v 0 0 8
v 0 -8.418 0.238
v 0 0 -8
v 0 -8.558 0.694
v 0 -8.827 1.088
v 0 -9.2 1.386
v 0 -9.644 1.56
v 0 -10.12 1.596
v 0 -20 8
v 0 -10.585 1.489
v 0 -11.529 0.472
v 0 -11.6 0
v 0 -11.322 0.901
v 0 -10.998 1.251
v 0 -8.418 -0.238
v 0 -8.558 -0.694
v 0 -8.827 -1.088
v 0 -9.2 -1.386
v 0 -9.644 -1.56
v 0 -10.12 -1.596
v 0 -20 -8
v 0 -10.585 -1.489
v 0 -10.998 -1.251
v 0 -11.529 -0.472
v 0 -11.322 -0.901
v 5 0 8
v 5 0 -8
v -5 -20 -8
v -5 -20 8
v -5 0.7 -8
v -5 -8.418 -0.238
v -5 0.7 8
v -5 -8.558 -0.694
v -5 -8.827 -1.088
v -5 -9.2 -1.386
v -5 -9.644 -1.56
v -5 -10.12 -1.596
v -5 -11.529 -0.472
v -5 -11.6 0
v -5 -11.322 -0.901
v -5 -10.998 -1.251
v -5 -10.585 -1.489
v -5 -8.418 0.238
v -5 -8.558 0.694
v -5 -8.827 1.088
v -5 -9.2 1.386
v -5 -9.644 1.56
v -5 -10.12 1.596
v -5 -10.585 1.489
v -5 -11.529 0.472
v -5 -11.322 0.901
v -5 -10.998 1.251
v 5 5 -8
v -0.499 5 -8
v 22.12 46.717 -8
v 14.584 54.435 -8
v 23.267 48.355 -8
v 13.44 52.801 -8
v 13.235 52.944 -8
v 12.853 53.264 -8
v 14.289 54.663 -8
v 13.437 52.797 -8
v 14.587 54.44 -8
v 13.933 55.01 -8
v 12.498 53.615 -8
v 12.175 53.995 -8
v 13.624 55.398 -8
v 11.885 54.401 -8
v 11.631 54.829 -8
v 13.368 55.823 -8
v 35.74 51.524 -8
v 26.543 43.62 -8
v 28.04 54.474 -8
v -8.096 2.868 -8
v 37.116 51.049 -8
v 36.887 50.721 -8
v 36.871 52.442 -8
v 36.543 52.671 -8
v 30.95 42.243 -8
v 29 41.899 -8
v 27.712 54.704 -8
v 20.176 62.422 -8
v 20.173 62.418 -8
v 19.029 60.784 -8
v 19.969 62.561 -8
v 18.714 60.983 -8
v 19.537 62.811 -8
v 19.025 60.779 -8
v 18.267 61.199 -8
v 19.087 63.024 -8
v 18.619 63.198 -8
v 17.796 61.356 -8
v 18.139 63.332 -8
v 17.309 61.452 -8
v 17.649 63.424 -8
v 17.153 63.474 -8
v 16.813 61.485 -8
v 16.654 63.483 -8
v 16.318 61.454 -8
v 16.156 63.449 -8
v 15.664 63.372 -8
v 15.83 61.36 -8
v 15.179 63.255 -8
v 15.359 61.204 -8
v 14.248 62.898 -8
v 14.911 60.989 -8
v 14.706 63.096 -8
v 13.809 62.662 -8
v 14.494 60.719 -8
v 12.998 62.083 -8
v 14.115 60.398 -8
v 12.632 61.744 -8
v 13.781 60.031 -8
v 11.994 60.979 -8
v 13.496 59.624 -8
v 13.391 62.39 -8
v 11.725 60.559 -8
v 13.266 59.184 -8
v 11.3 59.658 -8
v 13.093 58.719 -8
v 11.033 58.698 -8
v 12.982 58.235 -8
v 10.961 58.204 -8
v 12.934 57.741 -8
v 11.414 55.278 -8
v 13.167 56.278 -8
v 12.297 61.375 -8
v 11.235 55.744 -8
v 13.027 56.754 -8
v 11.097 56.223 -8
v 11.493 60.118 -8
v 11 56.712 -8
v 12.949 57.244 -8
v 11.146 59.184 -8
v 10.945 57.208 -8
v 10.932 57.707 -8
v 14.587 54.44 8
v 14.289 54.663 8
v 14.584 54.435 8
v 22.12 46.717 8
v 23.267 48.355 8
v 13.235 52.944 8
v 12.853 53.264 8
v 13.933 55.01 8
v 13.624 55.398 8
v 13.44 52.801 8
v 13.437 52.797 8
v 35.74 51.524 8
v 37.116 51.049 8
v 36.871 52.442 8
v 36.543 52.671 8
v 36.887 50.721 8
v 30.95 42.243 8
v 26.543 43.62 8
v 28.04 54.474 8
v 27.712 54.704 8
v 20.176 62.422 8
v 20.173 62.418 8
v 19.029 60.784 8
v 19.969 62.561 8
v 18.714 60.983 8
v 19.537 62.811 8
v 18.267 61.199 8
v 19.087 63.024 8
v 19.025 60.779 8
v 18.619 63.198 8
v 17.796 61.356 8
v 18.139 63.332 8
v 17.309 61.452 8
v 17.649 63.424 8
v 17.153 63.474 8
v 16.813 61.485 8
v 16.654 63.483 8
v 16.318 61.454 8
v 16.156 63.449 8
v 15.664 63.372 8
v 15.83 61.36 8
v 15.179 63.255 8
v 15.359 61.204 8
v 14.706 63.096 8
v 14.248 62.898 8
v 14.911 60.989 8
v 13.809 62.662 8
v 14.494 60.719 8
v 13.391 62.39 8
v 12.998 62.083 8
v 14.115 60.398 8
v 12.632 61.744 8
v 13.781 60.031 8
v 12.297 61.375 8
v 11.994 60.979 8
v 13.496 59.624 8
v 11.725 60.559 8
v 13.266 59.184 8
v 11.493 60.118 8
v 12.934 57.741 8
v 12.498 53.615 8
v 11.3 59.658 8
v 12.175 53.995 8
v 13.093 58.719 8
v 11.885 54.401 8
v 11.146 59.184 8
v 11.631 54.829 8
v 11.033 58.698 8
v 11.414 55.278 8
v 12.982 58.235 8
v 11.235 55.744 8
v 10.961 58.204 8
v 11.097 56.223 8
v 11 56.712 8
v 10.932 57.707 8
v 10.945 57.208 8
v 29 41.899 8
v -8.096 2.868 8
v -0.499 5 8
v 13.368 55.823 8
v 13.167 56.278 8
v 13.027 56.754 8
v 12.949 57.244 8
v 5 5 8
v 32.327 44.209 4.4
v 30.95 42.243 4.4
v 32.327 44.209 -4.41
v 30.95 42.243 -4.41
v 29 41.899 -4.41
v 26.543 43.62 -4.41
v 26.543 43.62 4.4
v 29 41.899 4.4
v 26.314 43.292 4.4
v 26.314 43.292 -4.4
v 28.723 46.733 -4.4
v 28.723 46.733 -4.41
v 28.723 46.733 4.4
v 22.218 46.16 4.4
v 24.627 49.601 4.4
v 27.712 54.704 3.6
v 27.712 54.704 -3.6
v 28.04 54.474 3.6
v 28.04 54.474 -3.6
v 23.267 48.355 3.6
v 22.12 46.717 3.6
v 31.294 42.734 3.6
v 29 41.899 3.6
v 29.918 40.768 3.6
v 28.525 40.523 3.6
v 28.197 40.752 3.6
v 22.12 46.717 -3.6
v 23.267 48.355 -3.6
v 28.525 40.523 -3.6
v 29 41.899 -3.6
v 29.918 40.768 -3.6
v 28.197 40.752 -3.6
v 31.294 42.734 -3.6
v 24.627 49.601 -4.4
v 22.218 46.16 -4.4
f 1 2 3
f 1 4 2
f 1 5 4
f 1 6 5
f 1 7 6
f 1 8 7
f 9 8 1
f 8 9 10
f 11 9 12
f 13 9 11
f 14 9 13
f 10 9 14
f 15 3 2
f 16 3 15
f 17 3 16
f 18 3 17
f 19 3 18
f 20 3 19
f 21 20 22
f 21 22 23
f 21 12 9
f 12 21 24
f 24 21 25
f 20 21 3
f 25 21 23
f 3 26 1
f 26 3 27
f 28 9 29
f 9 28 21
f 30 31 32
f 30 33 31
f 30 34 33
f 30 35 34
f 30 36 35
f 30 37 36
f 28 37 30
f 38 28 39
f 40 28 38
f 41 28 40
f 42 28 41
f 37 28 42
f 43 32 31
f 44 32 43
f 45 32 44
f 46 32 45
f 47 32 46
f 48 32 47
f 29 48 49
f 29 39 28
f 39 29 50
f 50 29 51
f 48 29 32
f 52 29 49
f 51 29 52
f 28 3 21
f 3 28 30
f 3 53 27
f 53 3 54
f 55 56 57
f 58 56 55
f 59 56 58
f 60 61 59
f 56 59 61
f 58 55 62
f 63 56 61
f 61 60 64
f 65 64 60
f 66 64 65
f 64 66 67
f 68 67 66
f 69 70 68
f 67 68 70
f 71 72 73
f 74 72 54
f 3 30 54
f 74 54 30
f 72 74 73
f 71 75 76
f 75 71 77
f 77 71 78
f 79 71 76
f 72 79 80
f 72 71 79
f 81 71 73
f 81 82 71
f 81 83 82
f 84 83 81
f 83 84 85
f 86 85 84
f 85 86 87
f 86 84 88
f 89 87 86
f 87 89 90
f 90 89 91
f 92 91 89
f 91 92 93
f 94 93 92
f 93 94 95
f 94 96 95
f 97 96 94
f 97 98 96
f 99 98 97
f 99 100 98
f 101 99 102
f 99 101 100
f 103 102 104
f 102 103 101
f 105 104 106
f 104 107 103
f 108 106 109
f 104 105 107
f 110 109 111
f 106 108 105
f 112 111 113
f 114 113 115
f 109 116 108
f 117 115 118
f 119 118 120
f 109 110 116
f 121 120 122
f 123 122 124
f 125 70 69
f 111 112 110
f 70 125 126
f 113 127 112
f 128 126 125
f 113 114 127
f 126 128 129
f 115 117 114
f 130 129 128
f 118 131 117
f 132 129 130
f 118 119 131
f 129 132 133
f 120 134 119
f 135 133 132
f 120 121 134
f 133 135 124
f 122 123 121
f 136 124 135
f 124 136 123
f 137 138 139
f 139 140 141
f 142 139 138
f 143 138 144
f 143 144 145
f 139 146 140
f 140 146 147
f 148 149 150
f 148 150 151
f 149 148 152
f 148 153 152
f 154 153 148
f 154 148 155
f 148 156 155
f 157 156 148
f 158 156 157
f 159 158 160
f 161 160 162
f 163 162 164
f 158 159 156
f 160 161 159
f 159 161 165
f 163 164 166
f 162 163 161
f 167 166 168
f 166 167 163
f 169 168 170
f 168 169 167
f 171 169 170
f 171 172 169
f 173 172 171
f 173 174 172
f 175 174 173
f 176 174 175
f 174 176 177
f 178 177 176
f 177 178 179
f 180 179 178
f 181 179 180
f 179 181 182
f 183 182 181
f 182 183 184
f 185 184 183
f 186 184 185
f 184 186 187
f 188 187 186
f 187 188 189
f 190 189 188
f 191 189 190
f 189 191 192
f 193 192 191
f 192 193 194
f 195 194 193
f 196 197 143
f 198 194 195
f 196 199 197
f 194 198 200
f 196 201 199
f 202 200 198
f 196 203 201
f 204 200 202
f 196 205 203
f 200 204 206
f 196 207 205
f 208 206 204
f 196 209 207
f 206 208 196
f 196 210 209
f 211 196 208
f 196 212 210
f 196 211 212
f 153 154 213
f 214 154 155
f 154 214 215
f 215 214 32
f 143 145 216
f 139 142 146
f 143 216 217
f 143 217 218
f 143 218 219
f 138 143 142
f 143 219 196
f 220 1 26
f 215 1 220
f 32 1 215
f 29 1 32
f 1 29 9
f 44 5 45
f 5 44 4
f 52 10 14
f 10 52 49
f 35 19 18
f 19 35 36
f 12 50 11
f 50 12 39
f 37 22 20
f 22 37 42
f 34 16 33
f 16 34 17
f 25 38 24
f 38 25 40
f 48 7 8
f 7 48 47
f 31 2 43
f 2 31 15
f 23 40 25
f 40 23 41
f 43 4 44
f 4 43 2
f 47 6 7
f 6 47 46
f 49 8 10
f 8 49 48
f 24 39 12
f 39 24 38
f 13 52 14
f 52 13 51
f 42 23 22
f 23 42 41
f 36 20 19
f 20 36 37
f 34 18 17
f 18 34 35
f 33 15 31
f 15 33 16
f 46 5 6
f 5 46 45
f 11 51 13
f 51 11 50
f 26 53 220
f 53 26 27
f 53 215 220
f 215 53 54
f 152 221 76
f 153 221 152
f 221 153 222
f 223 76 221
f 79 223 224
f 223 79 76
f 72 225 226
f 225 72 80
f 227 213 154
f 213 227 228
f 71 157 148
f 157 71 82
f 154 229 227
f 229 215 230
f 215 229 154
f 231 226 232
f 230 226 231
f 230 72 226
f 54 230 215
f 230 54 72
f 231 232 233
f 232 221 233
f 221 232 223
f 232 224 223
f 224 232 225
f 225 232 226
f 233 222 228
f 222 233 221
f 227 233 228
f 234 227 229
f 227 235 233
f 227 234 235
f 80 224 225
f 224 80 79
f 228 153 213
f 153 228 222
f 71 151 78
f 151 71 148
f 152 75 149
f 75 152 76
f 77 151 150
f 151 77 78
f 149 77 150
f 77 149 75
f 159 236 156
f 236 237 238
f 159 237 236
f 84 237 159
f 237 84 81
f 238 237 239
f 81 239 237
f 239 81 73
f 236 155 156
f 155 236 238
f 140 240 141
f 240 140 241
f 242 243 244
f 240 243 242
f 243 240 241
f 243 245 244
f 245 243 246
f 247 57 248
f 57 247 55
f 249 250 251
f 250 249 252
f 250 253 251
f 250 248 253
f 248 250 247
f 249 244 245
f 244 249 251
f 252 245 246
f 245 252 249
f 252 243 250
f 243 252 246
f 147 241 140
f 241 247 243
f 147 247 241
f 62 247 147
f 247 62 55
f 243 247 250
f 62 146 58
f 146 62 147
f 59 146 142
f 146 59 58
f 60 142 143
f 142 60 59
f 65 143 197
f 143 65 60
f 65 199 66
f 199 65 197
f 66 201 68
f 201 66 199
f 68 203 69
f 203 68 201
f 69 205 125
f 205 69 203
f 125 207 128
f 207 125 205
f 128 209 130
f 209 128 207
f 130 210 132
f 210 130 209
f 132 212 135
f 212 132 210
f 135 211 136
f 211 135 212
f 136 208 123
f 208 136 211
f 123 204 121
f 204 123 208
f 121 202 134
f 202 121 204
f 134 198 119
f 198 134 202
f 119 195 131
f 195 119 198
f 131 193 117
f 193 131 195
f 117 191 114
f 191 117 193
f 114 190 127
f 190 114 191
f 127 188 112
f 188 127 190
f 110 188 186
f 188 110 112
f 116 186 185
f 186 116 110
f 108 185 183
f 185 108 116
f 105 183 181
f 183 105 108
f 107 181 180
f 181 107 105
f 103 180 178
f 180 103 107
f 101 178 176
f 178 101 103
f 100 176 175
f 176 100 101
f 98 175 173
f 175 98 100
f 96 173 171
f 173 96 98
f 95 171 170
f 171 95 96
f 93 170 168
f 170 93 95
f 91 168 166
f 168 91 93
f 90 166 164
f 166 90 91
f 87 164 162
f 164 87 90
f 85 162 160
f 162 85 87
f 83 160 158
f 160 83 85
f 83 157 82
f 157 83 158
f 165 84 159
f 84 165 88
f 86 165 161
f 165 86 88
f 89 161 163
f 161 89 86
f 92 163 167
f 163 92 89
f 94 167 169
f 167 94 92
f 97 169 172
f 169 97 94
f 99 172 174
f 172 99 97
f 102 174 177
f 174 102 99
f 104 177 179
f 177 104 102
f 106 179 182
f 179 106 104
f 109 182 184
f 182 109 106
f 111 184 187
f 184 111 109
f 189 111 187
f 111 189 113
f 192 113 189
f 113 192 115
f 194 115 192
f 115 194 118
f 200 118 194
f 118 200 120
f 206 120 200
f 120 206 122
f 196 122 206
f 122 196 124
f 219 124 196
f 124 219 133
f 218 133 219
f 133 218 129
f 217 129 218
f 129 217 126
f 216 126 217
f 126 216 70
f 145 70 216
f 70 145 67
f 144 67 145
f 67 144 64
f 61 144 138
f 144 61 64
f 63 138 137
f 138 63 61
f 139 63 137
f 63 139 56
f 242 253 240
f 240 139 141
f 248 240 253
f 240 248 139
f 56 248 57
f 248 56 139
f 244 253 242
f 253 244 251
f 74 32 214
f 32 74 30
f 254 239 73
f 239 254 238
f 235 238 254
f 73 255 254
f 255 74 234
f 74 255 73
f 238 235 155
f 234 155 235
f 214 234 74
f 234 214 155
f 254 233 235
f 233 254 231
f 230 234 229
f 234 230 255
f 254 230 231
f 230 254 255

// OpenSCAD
// width 
width = 16; // [1:1:100]

// thickness
th = 5;  // [1:1:10]

// move the bracket back and forward
forward = -4;  // [-100:1:100]

// angle
angle = 35;  // [-180:1:90]

// length
length = 65;  // [30:1:1000]

/* [Hidden] */
base_length = 20; // 
gap = 11.75;
depth = 4;
hook_th = 1.4;
hook_chamfer = 0.4;
snap_th = 2;
snap_length = 16;
margin = 0.4;
e = 0.01;
$fa=1;
$fs=0.5;

// preview[view:south, tilt:top]

rotate([-90, 0, 0]) main();

module base()
{
    difference()
    {
        translate([-th, -width/2, -base_length]) cube([th, width, base_length]);
        translate([0, 0, -base_length/2]) rotate([0, 90, 0]) cylinder(d=3.2, h=th*2+e, center=true);
    }
    translate([0, -width/2, 0])
    {
        cube([max(th, forward), width, th]);
        mirror([1, 0, 0]) cube([max(th, -forward), width, th]);
    } 
}

module head()
{
    difference()
    {
        cube([depth+margin, width, gap]);
        translate([-e, width/4-margin, gap-snap_th-hook_th-margin])
        cube([depth+margin+2*e, width/2+2*margin+e, hook_th+snap_th+margin+e]);
        translate([depth+margin, -e, gap-hook_th]) rotate([0, -45, 0]) cube([hook_th, width+2*e, hook_th*2]);
    }
    translate([depth+margin, 0, 0]) difference()
    {
        mirror([1, 0, 1]) cube([hook_th, width, hook_th]);
        translate([0, -e, -hook_chamfer]) rotate([0, 135, 0]) cube([hook_th*2, width+2*e, hook_th]);
    }

    difference()
    {
        snap();
        translate([-margin-th, 0, snap_th])
        {
            cube([th+depth+margin*2, width/4+margin, gap+hook_th]);
            translate([0, width*3/4-margin, 0]) cube([th+depth+margin*2, width/4+margin, gap+hook_th]);
        }
    }
}

module snap()
{
    length = snap_length;
    module profile()
    {
        
        difference()
        {
            union()
            {
                translate([-length, gap/2]) circle(d=gap);
                rotate(90) square([gap, length]);
                translate([margin, gap-snap_th])
                {
                    square([depth, snap_th]);
                    translate([depth-hook_th, 0]) difference()
                    {
                        square([hook_th, snap_th+hook_th]);
                        translate([hook_th, snap_th+hook_chamfer]) rotate(45) square([hook_th, hook_th*2]);
                    } 
                }
                translate([0, gap-snap_th]) square([depth, snap_th]);
            }
            translate([0, snap_th]) rotate(90) square([gap-snap_th*2, length]);
            translate([-length, gap/2]) circle(d=gap-snap_th*2);
        }
    }
    translate([0, width, 0]) rotate([90, 0, 0]) linear_extrude(height=width) profile();
}

module neck()
{
    difference()
    {
        cube([th, width, length]);
        translate([-e, width/4-margin, length-gap-margin])
        cube([th+2*e, width/2+margin*2, hook_th+snap_th+margin*2]);
    }
}

module main()
{
    base();

    translate([forward, 0, 0])
    rotate([0, angle, 0])
    translate([-th, -width/2, 0])
    {
        translate([th, 0, length]) mirror([0, 0, 1]) head();
        neck();
    }
}
